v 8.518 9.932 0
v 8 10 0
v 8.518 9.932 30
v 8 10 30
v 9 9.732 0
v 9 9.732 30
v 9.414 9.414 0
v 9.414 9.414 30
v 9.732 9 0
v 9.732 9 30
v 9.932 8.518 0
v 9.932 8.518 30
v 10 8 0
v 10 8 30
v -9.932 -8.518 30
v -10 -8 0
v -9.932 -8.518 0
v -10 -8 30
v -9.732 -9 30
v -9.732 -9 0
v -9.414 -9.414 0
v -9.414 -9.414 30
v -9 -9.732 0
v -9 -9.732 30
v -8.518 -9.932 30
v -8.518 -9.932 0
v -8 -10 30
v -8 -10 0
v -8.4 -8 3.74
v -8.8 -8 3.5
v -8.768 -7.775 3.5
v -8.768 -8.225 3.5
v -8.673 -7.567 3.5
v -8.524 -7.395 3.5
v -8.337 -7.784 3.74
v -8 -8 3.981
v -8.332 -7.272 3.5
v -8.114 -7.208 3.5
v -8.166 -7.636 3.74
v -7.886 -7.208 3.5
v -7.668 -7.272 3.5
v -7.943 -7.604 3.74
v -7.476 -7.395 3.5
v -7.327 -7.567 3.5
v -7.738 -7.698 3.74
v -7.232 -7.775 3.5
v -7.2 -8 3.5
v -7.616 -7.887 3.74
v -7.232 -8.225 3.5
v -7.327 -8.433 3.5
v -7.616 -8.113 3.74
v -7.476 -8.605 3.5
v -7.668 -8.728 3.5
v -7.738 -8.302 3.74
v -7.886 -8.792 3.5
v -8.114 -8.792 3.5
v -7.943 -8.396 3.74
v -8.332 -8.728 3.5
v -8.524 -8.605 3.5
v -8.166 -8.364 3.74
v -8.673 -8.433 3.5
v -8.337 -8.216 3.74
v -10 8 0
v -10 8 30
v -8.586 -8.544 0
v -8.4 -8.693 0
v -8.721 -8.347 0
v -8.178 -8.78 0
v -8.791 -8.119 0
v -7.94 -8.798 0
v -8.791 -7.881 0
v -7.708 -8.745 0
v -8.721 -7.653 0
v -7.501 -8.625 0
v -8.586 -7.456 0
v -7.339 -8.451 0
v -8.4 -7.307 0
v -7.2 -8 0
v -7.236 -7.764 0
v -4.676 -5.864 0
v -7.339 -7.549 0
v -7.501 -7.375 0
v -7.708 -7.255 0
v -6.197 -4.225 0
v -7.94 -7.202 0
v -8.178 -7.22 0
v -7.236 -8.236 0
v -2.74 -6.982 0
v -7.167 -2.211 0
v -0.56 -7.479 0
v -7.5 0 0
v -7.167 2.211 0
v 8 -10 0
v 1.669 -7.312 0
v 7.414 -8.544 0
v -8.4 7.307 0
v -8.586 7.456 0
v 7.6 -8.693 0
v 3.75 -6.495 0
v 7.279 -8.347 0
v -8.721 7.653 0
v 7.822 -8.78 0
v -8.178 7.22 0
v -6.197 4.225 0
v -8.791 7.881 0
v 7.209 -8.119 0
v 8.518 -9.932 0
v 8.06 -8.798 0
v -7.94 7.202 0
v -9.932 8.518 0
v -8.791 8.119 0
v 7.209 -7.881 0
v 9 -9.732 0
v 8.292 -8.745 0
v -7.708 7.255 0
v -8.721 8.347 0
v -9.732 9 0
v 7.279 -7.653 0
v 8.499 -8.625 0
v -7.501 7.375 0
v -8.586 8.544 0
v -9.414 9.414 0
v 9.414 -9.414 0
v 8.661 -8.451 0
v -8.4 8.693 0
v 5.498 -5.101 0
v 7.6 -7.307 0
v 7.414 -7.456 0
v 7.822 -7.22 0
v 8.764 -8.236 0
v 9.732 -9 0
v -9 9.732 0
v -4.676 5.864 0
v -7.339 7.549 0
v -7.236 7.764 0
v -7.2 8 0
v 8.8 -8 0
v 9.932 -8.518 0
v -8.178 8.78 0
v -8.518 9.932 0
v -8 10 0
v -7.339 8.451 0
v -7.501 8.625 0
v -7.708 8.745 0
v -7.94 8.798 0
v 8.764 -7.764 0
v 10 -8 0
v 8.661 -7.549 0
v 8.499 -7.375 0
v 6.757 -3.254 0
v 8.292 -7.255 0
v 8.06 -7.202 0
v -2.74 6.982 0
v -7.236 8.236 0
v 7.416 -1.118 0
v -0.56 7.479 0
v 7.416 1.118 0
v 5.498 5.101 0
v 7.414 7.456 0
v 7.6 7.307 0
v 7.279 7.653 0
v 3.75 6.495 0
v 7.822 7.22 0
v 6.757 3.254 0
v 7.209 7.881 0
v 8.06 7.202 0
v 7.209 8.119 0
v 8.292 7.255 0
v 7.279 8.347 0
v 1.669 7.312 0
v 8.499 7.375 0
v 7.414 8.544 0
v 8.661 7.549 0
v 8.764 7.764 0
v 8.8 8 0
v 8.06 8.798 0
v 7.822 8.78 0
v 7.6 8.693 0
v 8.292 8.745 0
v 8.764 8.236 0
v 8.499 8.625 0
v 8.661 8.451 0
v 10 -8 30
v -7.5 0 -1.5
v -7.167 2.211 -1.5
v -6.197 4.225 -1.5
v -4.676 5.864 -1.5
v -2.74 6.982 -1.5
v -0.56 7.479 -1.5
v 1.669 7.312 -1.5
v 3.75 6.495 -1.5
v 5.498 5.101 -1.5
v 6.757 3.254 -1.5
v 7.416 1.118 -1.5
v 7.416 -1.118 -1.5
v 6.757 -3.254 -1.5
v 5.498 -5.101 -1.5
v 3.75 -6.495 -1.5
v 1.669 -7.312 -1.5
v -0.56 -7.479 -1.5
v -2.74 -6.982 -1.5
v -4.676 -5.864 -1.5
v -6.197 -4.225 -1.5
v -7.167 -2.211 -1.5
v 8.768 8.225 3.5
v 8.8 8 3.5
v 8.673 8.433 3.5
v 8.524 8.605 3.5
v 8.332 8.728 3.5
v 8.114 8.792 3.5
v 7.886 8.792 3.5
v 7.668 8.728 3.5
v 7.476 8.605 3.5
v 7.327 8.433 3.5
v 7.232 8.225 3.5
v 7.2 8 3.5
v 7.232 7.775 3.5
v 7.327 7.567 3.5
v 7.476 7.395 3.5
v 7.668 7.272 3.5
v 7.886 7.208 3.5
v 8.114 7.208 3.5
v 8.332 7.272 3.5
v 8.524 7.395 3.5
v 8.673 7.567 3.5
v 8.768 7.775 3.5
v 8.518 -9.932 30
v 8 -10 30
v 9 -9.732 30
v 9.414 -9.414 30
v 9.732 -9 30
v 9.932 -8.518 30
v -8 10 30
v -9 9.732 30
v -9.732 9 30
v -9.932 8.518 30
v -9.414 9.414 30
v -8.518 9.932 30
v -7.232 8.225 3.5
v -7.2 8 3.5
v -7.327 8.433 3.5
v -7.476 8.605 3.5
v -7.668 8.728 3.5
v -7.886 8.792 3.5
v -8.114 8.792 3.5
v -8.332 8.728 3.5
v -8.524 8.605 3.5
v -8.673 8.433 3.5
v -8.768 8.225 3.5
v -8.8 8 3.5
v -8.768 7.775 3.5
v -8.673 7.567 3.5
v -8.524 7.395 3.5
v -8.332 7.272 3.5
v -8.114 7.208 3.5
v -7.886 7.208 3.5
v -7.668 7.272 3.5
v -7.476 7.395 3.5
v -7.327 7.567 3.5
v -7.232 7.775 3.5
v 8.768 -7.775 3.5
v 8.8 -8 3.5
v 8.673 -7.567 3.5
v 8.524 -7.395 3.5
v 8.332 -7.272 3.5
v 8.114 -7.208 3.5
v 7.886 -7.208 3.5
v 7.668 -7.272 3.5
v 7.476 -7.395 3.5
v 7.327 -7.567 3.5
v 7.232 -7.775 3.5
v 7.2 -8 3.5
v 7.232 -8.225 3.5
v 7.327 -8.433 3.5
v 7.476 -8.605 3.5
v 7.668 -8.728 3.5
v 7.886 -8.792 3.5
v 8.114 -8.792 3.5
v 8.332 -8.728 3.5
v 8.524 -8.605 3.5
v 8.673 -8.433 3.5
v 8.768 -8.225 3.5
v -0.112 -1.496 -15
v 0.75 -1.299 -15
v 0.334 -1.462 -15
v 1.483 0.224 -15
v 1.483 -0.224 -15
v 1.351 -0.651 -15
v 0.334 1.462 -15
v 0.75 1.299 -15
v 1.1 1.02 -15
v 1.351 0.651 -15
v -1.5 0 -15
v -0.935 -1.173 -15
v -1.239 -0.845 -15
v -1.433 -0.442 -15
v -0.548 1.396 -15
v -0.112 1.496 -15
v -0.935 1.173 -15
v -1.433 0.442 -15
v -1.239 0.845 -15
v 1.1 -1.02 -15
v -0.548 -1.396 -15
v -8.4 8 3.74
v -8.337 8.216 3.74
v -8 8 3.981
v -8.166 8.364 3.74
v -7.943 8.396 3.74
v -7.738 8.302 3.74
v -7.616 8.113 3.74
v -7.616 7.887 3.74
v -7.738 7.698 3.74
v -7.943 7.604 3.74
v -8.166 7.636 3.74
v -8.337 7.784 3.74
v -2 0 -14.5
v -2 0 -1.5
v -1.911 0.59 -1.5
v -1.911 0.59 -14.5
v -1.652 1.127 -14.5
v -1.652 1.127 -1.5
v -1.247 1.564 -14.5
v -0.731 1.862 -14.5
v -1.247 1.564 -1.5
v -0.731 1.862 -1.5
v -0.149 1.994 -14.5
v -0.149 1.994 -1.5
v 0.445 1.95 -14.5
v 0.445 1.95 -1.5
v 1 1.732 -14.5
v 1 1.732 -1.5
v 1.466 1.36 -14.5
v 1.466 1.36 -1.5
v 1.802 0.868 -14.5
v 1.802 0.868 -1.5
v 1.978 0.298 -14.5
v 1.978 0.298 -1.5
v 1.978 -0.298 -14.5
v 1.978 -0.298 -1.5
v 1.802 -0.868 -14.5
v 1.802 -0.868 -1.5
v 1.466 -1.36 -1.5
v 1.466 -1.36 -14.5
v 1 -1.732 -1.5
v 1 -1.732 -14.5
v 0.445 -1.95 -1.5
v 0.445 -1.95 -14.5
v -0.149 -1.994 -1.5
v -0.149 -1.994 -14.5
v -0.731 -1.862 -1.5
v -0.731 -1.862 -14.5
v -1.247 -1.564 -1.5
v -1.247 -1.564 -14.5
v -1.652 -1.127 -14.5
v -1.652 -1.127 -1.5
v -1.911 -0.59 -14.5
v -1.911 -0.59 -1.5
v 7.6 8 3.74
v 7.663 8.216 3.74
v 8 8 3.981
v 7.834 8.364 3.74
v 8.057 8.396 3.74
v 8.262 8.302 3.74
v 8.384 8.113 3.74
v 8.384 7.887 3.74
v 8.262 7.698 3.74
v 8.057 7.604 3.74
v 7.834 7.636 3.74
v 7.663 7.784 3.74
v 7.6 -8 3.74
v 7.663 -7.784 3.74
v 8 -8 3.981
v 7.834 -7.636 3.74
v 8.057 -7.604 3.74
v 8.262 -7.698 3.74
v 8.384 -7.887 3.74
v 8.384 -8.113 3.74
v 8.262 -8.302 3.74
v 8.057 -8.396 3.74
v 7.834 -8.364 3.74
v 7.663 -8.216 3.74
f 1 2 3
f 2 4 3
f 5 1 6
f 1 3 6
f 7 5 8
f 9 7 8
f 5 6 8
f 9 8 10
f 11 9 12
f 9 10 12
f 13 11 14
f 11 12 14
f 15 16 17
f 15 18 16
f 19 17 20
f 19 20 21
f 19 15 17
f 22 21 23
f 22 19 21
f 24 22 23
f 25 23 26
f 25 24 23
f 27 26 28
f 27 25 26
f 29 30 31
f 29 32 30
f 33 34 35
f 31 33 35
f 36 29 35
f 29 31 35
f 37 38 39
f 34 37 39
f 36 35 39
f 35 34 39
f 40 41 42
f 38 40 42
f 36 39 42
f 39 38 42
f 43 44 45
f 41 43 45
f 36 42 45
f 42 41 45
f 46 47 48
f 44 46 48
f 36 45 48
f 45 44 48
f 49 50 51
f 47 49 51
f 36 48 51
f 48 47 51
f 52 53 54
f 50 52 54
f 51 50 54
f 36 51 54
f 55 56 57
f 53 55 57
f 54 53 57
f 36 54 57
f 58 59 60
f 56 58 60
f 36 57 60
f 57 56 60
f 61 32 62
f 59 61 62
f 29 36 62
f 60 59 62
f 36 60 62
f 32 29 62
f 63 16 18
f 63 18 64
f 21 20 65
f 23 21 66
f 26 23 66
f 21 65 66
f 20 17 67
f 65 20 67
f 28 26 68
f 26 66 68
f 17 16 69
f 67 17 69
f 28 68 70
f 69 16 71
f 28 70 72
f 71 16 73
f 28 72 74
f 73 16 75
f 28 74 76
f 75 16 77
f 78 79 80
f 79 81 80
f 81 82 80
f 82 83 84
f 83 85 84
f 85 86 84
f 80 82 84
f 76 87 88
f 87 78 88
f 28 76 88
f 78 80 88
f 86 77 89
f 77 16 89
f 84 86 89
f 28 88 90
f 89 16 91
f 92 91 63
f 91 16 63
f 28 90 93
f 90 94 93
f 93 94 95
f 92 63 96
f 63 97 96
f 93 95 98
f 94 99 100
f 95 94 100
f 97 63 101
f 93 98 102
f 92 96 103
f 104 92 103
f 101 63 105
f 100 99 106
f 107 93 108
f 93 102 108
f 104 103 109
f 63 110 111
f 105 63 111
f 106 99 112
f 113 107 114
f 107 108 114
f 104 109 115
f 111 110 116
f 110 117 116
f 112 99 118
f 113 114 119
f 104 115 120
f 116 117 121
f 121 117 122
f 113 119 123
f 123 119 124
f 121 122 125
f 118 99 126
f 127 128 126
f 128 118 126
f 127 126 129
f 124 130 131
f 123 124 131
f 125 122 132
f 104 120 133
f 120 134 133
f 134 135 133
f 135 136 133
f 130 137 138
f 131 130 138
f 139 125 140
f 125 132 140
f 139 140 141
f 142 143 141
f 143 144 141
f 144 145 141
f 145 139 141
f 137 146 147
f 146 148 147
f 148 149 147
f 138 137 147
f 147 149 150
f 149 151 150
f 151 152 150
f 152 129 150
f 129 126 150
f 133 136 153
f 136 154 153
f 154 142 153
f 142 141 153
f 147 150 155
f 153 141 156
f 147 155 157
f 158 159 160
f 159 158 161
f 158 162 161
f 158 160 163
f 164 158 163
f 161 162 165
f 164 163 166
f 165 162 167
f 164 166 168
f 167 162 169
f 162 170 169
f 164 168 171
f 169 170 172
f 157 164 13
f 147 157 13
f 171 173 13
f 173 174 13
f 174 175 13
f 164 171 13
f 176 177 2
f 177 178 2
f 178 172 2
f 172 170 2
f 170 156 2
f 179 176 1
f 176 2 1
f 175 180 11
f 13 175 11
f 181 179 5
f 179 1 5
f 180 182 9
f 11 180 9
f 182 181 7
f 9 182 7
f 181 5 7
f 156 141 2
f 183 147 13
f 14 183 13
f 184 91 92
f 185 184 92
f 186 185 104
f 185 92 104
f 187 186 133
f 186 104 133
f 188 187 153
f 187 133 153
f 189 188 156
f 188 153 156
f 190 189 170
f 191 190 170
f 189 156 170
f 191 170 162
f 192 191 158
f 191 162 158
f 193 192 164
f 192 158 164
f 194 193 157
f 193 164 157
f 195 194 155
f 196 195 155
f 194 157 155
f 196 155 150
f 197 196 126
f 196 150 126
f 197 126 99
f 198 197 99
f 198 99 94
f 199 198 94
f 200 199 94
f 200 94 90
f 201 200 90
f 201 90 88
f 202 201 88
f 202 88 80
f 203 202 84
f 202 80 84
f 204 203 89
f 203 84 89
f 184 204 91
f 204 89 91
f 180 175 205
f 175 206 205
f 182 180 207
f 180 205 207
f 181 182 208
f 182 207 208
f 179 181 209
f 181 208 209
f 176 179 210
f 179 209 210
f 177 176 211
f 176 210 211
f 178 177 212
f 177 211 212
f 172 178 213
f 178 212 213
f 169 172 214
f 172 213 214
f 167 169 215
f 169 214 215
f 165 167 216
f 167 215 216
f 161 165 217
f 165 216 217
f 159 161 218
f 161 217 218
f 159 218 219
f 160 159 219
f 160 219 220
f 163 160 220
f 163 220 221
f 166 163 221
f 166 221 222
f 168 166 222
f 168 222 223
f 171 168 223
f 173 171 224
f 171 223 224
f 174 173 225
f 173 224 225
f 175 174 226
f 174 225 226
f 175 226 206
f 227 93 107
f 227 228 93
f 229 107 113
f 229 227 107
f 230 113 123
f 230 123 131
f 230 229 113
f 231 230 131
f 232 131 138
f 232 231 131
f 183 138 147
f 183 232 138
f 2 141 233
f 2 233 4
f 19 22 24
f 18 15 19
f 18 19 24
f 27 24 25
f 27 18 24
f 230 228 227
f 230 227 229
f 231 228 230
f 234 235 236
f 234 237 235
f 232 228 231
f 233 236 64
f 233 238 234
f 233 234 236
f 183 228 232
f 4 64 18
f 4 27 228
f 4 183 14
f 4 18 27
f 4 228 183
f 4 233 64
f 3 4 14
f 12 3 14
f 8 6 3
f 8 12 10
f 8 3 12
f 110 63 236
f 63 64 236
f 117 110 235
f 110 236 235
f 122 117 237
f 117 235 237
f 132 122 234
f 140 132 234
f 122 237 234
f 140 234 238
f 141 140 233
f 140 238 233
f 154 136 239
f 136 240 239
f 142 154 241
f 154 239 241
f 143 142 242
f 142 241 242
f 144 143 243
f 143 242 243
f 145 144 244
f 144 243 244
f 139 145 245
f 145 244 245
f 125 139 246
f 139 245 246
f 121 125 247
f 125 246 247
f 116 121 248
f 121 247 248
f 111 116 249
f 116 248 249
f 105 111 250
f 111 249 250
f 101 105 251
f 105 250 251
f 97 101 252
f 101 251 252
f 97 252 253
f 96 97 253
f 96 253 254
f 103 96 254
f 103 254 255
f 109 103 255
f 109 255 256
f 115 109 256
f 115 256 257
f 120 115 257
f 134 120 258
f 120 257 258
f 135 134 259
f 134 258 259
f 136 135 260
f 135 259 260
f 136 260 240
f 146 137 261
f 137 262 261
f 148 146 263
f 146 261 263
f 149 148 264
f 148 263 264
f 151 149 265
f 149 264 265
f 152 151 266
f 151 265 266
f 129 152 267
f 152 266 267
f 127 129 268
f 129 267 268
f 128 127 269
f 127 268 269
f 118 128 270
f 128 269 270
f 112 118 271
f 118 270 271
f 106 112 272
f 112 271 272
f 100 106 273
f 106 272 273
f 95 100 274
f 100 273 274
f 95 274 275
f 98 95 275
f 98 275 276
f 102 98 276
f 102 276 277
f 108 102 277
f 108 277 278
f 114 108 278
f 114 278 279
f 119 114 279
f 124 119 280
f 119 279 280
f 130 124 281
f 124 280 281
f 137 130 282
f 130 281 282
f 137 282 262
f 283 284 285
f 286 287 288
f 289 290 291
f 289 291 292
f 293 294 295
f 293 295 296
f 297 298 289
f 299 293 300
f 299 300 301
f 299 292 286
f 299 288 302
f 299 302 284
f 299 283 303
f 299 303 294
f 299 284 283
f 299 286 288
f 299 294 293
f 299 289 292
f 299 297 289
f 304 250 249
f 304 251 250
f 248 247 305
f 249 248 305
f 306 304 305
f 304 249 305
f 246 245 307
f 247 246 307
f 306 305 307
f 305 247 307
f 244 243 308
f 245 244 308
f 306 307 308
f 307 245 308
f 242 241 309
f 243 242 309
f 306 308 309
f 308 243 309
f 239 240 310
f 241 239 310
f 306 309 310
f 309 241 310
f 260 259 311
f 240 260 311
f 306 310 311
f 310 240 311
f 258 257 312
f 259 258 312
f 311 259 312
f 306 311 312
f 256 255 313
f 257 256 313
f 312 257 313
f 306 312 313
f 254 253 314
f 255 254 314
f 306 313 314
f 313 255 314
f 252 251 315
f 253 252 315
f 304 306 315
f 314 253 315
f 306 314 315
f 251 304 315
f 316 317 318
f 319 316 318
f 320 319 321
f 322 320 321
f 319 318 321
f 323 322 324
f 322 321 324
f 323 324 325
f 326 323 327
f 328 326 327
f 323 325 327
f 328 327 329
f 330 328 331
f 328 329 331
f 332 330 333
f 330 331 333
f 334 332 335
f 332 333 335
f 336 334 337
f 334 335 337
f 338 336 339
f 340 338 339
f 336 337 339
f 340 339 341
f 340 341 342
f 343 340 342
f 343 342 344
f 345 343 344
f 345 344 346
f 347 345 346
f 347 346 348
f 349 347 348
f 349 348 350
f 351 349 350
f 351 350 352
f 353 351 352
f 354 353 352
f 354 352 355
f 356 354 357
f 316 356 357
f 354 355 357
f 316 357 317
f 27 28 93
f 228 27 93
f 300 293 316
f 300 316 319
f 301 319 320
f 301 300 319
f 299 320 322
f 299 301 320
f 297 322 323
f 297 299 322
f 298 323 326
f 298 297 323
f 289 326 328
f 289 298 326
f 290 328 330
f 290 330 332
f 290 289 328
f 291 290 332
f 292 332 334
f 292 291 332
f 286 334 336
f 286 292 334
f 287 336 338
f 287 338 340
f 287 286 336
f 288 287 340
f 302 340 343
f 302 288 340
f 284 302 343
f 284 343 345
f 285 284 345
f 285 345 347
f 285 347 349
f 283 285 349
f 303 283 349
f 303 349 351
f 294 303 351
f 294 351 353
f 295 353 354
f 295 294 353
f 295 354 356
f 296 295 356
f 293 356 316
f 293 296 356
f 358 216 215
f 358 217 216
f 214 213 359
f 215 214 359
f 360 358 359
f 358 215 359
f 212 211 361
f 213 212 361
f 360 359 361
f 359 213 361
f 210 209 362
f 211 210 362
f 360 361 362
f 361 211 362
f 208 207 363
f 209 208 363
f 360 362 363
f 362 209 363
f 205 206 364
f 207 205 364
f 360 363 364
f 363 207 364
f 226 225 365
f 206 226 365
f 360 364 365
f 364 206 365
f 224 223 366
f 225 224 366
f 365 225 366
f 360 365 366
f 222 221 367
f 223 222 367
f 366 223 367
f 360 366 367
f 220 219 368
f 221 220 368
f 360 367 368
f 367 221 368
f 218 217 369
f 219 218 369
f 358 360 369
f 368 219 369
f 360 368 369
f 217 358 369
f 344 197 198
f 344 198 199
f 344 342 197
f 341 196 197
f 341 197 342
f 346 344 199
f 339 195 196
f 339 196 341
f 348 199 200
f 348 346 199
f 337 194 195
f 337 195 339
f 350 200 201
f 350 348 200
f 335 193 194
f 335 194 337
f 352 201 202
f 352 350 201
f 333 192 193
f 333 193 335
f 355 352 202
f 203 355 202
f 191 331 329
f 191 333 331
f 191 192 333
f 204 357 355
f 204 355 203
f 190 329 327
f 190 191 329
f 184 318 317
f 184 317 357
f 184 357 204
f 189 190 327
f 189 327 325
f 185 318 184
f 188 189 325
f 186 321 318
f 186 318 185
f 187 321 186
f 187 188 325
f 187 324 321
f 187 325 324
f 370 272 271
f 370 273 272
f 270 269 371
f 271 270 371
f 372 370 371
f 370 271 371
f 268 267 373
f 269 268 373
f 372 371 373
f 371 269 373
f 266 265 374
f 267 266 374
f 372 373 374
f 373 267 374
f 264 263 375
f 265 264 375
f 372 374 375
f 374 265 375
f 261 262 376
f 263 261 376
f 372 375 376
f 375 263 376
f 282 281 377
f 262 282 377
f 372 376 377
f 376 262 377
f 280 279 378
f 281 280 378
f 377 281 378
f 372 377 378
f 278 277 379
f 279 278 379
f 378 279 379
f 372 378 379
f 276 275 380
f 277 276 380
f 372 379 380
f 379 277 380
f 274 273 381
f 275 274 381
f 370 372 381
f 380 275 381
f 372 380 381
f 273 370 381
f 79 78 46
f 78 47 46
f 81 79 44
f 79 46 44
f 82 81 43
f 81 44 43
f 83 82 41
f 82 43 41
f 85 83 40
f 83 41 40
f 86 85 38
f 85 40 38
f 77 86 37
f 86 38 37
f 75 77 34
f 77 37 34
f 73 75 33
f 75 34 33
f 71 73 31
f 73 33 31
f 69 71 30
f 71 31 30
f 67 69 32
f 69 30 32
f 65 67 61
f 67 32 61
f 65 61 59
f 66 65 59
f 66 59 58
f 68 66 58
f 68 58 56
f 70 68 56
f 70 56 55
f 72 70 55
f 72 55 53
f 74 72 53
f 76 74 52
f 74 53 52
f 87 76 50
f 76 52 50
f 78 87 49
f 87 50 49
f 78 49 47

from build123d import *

# Parameters (mm, degrees)
SKETCH1_W                 = 20
SKETCH1_H                 = 20
BOSS_EXTRUDE1_DEPTH       = 30
SKETCH2_R                 = 7.5
BOSS_EXTRUDE2_DEPTH       = 1.5
SKETCH3_R                 = 2
BOSS_EXTRUDE3_DEPTH       = 13.5
M2X0_4_TAPPED_HOLE1_D     = 1.6
M2X0_4_TAPPED_HOLE1_DEPTH = 3.5
M2X0_4_TAPPED_HOLE1_TIP   = 0.480688495
FILLET1_R                 = 2
CHAMFER1_SIZE             = 0.5


with BuildPart() as part:
    # Sketch1 → Boss-Extrude1 (new body)
    with BuildSketch(Plane.XY):
        Rectangle(SKETCH1_W, SKETCH1_H)
    extrude(amount=BOSS_EXTRUDE1_DEPTH)

    # Sketch2 → Boss-Extrude2 (add)
    with BuildSketch(Plane(origin=(0, 0, 0), x_dir=(-1, 0, 0), z_dir=(0, 0, -1))):
        Circle(SKETCH2_R)
    extrude(amount=BOSS_EXTRUDE2_DEPTH)

    # Sketch3 → Boss-Extrude3 (add)
    with BuildSketch(Plane(origin=(0, 0, -1.5), x_dir=(-1, 0, 0), z_dir=(0, 0, -1))):
        Circle(SKETCH3_R)
    extrude(amount=BOSS_EXTRUDE3_DEPTH)

    # M2x0.4 Tapped Hole1
    with Locations(Plane(origin=(0, 0, 0), x_dir=(-1, 0, 0), z_dir=(0, 0, -1))):
        with Locations((-8, 8), (8, 8), (8, -8), (-8, -8)):
            Hole(M2X0_4_TAPPED_HOLE1_D / 2, depth=M2X0_4_TAPPED_HOLE1_DEPTH)
            with Locations((0, 0, -(M2X0_4_TAPPED_HOLE1_DEPTH + M2X0_4_TAPPED_HOLE1_TIP / 2))):  # 118° drill point
                Cone(0, M2X0_4_TAPPED_HOLE1_D / 2, M2X0_4_TAPPED_HOLE1_TIP, mode=Mode.SUBTRACT)

    # Fillet1
    fillet1_edges = [part.edges().sort_by_distance(p)[0] for p in [
        (10, -10, 15),
        (-10, -10, 15),
        (-10, 10, 15),
        (10, 10, 15),
    ]]
    fillet(fillet1_edges, radius=FILLET1_R)

    # Chamfer1
    chamfer1_edges = [part.edges().sort_by_distance(p)[0] for p in [
        (2, 0, -15),
    ]]
    chamfer(chamfer1_edges, length=CHAMFER1_SIZE)


solid = part.part
